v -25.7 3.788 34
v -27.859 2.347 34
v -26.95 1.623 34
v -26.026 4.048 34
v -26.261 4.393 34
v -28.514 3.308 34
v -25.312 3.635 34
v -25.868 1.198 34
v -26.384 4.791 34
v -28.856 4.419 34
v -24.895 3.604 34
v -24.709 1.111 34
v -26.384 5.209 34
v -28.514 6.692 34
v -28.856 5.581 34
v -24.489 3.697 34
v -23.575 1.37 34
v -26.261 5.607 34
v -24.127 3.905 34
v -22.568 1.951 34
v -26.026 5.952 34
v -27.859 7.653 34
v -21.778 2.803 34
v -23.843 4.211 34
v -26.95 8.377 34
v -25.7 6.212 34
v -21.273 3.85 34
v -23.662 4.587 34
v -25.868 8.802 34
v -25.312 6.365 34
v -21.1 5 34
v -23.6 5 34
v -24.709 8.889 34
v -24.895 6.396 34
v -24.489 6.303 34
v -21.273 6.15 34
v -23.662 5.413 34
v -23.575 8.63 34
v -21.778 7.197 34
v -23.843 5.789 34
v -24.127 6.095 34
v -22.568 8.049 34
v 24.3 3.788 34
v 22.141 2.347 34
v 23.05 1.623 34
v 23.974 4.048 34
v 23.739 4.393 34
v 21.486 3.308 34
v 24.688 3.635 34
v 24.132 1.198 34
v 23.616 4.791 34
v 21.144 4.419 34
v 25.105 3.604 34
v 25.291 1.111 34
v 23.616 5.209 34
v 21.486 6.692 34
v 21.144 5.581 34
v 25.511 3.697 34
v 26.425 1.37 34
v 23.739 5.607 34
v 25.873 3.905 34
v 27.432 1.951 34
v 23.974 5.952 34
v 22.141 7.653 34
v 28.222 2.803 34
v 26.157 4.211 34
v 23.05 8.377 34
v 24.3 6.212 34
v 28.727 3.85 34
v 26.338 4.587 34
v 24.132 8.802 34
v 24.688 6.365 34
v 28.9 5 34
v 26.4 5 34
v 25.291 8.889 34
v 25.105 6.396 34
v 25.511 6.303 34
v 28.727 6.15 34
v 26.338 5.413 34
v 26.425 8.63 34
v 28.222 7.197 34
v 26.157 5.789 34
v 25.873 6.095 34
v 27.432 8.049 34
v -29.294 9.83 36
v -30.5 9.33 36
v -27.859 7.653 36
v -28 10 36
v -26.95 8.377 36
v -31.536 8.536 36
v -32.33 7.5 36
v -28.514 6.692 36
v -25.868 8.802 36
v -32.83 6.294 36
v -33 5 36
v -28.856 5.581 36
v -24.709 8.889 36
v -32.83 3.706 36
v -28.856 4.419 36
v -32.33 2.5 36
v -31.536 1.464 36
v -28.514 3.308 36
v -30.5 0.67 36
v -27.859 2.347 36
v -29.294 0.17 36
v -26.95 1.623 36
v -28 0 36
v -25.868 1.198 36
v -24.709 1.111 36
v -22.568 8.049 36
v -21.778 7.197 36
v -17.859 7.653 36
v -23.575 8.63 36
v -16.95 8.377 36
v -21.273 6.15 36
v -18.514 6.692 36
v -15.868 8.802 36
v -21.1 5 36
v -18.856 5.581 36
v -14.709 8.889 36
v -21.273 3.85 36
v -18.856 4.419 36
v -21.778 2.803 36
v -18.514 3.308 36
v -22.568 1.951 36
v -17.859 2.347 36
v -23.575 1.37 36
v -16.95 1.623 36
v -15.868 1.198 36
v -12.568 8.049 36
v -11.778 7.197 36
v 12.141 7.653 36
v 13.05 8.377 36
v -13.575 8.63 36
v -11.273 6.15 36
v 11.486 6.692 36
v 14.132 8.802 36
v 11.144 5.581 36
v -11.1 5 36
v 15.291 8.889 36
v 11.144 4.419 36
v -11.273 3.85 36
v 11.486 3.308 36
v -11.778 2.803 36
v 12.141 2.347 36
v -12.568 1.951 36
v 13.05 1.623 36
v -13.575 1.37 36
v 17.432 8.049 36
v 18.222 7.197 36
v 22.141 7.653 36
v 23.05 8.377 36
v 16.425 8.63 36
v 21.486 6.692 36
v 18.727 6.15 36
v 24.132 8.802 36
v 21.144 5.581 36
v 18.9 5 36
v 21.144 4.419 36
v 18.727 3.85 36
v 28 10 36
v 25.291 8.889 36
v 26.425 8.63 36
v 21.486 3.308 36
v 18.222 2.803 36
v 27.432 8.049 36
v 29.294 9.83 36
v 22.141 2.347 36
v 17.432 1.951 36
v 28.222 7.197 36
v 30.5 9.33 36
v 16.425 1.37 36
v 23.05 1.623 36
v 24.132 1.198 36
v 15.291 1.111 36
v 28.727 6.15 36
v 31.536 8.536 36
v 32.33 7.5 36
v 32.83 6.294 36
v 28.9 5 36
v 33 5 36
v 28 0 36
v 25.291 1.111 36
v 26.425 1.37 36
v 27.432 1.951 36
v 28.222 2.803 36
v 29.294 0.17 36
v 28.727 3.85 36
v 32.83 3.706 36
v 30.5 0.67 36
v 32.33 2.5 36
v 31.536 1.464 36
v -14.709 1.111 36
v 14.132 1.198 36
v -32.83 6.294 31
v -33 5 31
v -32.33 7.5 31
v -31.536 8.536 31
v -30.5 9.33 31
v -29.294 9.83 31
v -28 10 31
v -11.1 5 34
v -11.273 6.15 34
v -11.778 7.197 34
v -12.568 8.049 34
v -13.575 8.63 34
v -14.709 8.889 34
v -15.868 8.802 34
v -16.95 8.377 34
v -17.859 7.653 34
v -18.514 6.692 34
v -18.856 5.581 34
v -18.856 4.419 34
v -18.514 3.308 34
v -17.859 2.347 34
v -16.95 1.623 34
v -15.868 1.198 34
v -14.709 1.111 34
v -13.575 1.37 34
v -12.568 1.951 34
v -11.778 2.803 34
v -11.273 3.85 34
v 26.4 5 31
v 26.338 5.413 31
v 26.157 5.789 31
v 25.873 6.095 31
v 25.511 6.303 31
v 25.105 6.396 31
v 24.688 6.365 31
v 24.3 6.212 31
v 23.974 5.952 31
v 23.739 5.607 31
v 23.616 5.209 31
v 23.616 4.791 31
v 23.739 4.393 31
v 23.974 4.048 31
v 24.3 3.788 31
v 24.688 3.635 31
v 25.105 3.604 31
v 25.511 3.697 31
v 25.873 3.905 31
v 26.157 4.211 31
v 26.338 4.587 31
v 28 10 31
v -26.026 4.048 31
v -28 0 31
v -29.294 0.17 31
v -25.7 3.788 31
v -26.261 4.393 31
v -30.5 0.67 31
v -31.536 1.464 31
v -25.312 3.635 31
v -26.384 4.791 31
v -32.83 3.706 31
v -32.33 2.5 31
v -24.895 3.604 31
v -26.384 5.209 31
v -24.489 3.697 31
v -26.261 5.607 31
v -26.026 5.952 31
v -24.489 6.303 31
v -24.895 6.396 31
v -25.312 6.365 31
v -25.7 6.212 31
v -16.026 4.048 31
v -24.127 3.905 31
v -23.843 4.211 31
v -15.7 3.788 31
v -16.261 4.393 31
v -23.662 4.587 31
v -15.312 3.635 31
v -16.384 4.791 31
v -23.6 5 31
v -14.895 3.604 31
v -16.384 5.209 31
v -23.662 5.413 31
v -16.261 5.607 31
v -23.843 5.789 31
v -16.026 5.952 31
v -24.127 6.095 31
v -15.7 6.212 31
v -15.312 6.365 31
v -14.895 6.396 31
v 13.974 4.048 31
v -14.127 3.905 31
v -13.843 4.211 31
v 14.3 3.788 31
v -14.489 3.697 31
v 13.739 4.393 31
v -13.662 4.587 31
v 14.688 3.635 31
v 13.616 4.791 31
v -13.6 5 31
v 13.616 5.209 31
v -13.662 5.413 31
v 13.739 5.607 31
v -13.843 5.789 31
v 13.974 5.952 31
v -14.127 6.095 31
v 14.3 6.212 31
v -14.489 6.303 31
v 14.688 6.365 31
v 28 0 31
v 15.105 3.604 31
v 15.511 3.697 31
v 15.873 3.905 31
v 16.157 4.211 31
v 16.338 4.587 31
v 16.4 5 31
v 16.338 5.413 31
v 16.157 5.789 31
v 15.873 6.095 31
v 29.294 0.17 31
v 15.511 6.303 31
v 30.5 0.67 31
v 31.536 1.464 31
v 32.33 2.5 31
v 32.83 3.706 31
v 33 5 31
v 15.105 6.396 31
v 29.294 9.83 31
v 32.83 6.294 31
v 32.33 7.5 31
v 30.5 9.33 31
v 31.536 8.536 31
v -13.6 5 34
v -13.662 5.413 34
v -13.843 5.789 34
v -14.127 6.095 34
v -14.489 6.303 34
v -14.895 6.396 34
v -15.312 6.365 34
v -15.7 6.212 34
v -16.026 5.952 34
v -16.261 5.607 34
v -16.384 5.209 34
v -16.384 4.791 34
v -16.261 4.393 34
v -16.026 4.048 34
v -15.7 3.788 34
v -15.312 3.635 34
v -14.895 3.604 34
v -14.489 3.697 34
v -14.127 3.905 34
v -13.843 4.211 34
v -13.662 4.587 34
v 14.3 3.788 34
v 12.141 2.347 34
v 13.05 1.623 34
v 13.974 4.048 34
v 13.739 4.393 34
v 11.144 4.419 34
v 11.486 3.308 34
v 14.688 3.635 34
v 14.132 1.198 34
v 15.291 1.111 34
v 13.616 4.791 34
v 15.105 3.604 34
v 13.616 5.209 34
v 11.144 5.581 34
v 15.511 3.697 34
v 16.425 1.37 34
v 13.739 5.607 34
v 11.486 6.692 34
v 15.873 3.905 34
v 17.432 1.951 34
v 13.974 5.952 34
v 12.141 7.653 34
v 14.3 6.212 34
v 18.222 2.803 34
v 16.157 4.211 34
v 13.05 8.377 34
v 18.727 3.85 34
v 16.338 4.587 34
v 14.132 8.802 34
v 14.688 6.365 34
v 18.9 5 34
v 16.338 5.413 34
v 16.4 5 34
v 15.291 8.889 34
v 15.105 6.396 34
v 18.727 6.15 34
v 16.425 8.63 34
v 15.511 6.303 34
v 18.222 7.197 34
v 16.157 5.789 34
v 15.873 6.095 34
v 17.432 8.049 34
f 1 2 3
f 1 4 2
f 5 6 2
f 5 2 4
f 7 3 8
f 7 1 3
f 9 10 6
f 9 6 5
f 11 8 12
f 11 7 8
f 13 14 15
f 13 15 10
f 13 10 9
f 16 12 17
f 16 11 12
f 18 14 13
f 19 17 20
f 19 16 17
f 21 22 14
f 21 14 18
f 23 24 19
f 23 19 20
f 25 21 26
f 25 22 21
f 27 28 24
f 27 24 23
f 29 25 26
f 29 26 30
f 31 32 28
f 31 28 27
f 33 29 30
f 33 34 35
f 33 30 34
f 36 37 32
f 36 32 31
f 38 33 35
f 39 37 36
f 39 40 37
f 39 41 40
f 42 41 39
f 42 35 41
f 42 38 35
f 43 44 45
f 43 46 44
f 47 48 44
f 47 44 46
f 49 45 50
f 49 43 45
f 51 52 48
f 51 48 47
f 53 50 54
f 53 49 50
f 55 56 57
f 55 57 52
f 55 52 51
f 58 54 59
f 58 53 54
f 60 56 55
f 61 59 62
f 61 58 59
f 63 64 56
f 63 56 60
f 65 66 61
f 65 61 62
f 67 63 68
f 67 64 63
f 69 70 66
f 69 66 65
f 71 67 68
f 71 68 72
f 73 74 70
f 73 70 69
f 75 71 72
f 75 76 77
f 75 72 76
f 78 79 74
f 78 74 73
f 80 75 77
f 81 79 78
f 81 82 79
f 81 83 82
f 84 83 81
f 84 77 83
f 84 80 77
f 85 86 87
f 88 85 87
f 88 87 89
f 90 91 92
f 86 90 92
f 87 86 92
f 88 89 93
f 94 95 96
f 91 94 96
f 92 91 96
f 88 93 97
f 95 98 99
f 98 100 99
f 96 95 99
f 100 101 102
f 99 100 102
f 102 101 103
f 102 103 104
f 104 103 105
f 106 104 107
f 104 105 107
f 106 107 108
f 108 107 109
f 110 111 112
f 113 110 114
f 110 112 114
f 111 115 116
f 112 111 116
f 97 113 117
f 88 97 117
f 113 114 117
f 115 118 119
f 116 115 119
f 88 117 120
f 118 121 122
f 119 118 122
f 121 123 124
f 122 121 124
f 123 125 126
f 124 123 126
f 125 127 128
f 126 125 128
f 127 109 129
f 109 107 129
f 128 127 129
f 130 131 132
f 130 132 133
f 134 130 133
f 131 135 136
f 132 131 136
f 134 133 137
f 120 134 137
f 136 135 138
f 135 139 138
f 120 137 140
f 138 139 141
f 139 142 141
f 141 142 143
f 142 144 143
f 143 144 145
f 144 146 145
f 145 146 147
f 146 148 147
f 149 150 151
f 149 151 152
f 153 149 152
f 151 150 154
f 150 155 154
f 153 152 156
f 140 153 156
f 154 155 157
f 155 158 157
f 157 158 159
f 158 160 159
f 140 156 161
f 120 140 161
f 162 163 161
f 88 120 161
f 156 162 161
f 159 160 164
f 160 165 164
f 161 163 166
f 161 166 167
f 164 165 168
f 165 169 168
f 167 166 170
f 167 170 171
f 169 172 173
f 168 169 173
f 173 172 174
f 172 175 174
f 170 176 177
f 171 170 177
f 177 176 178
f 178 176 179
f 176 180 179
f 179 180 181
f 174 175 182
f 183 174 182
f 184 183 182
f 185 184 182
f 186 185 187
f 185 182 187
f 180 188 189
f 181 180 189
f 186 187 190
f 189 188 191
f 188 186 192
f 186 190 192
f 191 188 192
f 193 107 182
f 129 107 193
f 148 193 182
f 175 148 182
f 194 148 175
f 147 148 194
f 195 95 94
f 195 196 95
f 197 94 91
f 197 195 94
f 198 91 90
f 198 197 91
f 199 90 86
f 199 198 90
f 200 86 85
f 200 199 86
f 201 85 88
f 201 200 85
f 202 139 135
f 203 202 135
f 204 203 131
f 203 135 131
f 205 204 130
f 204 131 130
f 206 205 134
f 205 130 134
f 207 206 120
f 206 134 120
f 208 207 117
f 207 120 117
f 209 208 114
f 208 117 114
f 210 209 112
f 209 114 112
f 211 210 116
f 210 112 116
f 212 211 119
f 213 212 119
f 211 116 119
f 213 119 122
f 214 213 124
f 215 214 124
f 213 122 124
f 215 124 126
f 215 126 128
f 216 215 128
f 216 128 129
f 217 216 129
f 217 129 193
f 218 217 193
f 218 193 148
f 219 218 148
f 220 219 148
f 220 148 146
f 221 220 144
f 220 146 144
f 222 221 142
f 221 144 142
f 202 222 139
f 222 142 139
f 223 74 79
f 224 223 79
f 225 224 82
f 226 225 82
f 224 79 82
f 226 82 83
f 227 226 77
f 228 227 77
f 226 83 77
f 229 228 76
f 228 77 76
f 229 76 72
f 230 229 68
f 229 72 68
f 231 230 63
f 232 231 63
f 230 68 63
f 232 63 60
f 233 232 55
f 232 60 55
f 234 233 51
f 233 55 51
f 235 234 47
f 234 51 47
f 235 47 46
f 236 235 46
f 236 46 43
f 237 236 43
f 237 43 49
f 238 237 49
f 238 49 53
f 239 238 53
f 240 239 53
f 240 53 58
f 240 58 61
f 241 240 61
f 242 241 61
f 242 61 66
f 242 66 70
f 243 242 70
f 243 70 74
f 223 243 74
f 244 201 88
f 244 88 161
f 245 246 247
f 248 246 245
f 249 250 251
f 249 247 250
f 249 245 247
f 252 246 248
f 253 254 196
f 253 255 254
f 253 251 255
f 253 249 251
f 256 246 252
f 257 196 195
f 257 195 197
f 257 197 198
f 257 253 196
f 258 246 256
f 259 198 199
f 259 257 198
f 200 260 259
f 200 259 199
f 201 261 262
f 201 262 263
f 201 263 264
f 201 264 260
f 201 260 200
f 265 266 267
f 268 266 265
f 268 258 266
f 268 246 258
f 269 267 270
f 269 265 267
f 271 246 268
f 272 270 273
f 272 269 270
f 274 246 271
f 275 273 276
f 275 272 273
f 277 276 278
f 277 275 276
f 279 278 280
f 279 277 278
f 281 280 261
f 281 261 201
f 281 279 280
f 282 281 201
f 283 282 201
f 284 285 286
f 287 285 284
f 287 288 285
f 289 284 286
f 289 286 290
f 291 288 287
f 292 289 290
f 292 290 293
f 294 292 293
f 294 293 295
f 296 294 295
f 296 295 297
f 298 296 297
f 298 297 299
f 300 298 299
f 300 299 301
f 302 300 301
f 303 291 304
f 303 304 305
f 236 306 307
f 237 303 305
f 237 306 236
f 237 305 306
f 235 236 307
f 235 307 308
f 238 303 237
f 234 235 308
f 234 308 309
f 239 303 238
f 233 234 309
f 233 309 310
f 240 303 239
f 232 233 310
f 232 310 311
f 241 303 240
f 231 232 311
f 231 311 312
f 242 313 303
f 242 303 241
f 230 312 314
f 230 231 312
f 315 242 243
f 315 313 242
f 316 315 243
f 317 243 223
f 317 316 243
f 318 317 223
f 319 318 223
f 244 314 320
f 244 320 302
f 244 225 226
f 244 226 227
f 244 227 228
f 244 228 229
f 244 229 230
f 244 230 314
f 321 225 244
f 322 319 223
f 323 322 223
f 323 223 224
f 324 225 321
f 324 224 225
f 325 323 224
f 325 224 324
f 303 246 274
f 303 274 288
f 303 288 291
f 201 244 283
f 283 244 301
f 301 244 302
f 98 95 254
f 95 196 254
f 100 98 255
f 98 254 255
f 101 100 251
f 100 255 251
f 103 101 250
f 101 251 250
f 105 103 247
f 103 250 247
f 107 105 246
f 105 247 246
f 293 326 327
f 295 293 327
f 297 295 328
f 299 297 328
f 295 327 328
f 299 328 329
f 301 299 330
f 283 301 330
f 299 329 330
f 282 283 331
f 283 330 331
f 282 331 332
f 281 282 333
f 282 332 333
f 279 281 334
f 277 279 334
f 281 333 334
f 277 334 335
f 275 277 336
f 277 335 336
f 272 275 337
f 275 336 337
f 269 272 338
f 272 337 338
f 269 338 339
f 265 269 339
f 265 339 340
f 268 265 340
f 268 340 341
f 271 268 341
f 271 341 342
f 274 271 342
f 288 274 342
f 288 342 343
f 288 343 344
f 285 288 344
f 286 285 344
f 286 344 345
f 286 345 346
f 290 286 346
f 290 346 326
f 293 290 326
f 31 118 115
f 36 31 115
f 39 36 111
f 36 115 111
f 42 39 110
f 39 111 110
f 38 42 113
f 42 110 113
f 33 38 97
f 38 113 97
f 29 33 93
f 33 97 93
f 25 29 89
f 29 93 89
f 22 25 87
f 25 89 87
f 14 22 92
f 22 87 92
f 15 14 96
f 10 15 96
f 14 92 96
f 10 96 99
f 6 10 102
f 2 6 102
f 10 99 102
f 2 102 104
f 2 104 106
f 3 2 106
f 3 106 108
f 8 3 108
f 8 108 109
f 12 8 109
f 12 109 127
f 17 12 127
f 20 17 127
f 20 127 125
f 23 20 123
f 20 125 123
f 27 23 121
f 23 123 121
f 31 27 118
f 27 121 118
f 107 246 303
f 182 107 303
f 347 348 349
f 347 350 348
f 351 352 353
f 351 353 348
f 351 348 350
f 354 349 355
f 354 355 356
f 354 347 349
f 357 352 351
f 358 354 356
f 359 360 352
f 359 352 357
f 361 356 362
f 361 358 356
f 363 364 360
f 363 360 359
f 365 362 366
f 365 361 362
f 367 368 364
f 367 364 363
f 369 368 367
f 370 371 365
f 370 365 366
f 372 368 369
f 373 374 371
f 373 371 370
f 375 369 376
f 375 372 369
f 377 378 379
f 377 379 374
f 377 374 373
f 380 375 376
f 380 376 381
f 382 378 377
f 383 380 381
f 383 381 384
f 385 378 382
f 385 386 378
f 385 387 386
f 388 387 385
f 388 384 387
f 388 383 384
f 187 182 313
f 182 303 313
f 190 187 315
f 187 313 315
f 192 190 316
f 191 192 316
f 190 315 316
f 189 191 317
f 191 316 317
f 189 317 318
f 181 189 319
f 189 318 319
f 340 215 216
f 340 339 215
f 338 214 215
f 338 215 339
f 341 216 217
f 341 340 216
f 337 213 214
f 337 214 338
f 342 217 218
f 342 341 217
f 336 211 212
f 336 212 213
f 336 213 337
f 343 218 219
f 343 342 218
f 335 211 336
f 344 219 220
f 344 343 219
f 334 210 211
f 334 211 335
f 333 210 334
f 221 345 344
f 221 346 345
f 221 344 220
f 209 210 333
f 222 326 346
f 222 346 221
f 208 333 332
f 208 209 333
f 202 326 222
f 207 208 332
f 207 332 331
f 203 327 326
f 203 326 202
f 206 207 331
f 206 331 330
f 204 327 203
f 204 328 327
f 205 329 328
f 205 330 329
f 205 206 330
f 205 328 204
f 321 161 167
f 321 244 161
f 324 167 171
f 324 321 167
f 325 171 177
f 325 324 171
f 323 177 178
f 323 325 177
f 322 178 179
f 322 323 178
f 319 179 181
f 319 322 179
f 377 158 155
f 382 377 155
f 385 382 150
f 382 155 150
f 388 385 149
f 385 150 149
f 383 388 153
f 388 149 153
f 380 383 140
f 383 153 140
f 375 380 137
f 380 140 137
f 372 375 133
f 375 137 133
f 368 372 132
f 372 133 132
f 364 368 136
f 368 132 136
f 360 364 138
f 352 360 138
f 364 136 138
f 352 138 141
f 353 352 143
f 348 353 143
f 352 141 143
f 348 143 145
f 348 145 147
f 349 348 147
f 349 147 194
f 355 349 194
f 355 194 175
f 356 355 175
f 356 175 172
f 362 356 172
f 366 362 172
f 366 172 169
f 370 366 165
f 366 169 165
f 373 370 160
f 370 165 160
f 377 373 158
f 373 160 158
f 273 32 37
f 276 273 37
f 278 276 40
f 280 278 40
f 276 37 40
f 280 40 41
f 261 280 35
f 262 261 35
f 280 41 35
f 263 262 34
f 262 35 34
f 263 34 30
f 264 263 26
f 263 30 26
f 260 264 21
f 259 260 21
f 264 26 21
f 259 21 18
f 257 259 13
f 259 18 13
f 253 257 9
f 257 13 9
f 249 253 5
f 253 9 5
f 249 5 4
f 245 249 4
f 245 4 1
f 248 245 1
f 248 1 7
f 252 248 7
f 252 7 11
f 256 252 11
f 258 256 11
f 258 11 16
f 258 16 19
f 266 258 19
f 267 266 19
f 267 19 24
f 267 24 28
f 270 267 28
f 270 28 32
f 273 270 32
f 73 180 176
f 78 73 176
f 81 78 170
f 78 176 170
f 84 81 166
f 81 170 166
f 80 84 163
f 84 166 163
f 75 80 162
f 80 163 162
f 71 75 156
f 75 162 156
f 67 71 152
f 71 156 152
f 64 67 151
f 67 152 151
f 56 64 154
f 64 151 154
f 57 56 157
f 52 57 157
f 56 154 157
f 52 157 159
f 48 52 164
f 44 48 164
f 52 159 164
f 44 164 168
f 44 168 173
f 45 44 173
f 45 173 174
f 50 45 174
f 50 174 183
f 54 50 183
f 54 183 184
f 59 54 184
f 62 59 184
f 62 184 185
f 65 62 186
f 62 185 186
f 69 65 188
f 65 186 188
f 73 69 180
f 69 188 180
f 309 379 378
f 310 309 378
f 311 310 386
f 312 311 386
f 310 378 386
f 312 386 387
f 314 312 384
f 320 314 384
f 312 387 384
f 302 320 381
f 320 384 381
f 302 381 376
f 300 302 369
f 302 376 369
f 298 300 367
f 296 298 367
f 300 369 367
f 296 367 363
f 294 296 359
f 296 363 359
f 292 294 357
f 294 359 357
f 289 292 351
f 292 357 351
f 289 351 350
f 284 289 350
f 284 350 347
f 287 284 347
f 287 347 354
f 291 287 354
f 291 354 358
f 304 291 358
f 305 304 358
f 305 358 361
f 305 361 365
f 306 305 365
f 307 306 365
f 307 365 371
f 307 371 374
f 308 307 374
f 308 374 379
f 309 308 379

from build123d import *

# Parameters (mm, degrees)
SKETCH1_W               = 66
SKETCH1_H               = 72
BOSS_EXTRUDE1_DEPTH     = 10
SKETCH2_R               = 1.4
CUT_EXTRUDE1_DEPTH      = 10
CUT_EXTRUDE2_DEPTH      = 50.849774322
CUT_EXTRUDE2_DEPTH_BACK = 50.849774322
SKETCH3_W               = 30
SKETCH3_H               = 5
SKETCH5_R               = 7.5
BOSS_EXTRUDE2_DEPTH     = 1.5
SKETCH6_W               = 67
SKETCH6_H               = 25
CUT_EXTRUDE4_DEPTH      = 77.054256949
FILLET1_R               = 5
SKETCH7_R               = 3.9
SKETCH7_R_2             = 1.4
CUT_EXTRUDE5_DEPTH      = 2


with BuildPart() as part:
    # Sketch1 → Boss-Extrude1 (new body)
    with BuildSketch(Plane(origin=(0, 0, 0), x_dir=(1, 0, 0), z_dir=(0, 1, 0))):
        Rectangle(SKETCH1_W, SKETCH1_H)
    extrude(amount=BOSS_EXTRUDE1_DEPTH)

    # Sketch2 → Cut-Extrude1 (cut)
    with BuildSketch(Plane.XY.offset(36)):
        with Locations((-15, 5)):
            Circle(SKETCH2_R)
        with Locations((15, 5)):
            Circle(SKETCH2_R)
        with Locations((-25, 5)):
            Circle(SKETCH2_R)
        with Locations((25, 5)):
            Circle(SKETCH2_R)
    cut_extrude1 = extrude(amount=-CUT_EXTRUDE1_DEPTH, mode=Mode.SUBTRACT)

    # Mirror1: Cut-Extrude1 across plane
    add(cut_extrude1.mirror(Plane.XY), mode=Mode.SUBTRACT)

    # Sketch3 → Cut-Extrude2 (cut, two sides: drawn at the far end of the back side and taken through both)
    with BuildSketch(Plane(origin=(0, 10, 0), x_dir=(1, 0, 0), z_dir=(0, 1, 0)).offset(-CUT_EXTRUDE2_DEPTH_BACK)):
        with Locations((0, -19)):
            Rectangle(SKETCH3_W, SKETCH3_H)
        with Locations((0, 19)):
            Rectangle(SKETCH3_W, SKETCH3_H)
    extrude(amount=CUT_EXTRUDE2_DEPTH + CUT_EXTRUDE2_DEPTH_BACK, mode=Mode.SUBTRACT)

    # Sketch5 → Boss-Extrude2 (add)
    with BuildSketch(Plane(origin=(0, 10, 0), x_dir=(1, 0, 0), z_dir=(0, 1, 0))):
        with Locations(Location((0, 0, 0), (0, 0, 270))):
            Circle(SKETCH5_R)
    extrude(amount=BOSS_EXTRUDE2_DEPTH)

    # Sketch6 → Cut-Extrude4 (cut, through all)
    with BuildSketch(Plane(origin=(33, 0, 0), x_dir=(0, 0, -1), z_dir=(1, 0, 0))):
        with Locations((2.5, 12.5)):
            Rectangle(SKETCH6_W, SKETCH6_H)
    extrude(amount=-CUT_EXTRUDE4_DEPTH, mode=Mode.SUBTRACT)

    # Fillet1
    fillet1_edges = [part.edges().sort_by_distance(p)[0] for p in [
        (33, 0, 33.5),
        (33, 10, 33.5),
        (-33, 0, 33.5),
        (-33, 10, 33.5),
    ]]
    fillet(fillet1_edges, radius=FILLET1_R - 0.0001)  # a hair under: the kernel refuses the full size

    # Sketch7 → Cut-Extrude5 (cut)
    # profile 1 of 4: a face of its own
    with BuildSketch(Plane.XY.offset(36)):
        with Locations((-25, 5)):
            Circle(SKETCH7_R)
        with Locations((-25, 5)):
            Circle(SKETCH7_R_2, mode=Mode.SUBTRACT)
    # profile 2 of 4: a face of its own
    with BuildSketch(Plane.XY.offset(36)):
        with Locations((-15, 5)):
            Circle(SKETCH7_R)
        with Locations((-15, 5)):
            Circle(SKETCH7_R_2, mode=Mode.SUBTRACT)
    # profile 3 of 4: a face of its own
    with BuildSketch(Plane.XY.offset(36)):
        with Locations((15, 5)):
            Circle(SKETCH7_R)
        with Locations((15, 5)):
            Circle(SKETCH7_R_2, mode=Mode.SUBTRACT)
    # profile 4 of 4: a face of its own
    with BuildSketch(Plane.XY.offset(36)):
        with Locations((25, 5)):
            Circle(SKETCH7_R)
        with Locations((25, 5)):
            Circle(SKETCH7_R_2, mode=Mode.SUBTRACT)
    extrude(amount=-CUT_EXTRUDE5_DEPTH, mode=Mode.SUBTRACT)


solid = part.part
